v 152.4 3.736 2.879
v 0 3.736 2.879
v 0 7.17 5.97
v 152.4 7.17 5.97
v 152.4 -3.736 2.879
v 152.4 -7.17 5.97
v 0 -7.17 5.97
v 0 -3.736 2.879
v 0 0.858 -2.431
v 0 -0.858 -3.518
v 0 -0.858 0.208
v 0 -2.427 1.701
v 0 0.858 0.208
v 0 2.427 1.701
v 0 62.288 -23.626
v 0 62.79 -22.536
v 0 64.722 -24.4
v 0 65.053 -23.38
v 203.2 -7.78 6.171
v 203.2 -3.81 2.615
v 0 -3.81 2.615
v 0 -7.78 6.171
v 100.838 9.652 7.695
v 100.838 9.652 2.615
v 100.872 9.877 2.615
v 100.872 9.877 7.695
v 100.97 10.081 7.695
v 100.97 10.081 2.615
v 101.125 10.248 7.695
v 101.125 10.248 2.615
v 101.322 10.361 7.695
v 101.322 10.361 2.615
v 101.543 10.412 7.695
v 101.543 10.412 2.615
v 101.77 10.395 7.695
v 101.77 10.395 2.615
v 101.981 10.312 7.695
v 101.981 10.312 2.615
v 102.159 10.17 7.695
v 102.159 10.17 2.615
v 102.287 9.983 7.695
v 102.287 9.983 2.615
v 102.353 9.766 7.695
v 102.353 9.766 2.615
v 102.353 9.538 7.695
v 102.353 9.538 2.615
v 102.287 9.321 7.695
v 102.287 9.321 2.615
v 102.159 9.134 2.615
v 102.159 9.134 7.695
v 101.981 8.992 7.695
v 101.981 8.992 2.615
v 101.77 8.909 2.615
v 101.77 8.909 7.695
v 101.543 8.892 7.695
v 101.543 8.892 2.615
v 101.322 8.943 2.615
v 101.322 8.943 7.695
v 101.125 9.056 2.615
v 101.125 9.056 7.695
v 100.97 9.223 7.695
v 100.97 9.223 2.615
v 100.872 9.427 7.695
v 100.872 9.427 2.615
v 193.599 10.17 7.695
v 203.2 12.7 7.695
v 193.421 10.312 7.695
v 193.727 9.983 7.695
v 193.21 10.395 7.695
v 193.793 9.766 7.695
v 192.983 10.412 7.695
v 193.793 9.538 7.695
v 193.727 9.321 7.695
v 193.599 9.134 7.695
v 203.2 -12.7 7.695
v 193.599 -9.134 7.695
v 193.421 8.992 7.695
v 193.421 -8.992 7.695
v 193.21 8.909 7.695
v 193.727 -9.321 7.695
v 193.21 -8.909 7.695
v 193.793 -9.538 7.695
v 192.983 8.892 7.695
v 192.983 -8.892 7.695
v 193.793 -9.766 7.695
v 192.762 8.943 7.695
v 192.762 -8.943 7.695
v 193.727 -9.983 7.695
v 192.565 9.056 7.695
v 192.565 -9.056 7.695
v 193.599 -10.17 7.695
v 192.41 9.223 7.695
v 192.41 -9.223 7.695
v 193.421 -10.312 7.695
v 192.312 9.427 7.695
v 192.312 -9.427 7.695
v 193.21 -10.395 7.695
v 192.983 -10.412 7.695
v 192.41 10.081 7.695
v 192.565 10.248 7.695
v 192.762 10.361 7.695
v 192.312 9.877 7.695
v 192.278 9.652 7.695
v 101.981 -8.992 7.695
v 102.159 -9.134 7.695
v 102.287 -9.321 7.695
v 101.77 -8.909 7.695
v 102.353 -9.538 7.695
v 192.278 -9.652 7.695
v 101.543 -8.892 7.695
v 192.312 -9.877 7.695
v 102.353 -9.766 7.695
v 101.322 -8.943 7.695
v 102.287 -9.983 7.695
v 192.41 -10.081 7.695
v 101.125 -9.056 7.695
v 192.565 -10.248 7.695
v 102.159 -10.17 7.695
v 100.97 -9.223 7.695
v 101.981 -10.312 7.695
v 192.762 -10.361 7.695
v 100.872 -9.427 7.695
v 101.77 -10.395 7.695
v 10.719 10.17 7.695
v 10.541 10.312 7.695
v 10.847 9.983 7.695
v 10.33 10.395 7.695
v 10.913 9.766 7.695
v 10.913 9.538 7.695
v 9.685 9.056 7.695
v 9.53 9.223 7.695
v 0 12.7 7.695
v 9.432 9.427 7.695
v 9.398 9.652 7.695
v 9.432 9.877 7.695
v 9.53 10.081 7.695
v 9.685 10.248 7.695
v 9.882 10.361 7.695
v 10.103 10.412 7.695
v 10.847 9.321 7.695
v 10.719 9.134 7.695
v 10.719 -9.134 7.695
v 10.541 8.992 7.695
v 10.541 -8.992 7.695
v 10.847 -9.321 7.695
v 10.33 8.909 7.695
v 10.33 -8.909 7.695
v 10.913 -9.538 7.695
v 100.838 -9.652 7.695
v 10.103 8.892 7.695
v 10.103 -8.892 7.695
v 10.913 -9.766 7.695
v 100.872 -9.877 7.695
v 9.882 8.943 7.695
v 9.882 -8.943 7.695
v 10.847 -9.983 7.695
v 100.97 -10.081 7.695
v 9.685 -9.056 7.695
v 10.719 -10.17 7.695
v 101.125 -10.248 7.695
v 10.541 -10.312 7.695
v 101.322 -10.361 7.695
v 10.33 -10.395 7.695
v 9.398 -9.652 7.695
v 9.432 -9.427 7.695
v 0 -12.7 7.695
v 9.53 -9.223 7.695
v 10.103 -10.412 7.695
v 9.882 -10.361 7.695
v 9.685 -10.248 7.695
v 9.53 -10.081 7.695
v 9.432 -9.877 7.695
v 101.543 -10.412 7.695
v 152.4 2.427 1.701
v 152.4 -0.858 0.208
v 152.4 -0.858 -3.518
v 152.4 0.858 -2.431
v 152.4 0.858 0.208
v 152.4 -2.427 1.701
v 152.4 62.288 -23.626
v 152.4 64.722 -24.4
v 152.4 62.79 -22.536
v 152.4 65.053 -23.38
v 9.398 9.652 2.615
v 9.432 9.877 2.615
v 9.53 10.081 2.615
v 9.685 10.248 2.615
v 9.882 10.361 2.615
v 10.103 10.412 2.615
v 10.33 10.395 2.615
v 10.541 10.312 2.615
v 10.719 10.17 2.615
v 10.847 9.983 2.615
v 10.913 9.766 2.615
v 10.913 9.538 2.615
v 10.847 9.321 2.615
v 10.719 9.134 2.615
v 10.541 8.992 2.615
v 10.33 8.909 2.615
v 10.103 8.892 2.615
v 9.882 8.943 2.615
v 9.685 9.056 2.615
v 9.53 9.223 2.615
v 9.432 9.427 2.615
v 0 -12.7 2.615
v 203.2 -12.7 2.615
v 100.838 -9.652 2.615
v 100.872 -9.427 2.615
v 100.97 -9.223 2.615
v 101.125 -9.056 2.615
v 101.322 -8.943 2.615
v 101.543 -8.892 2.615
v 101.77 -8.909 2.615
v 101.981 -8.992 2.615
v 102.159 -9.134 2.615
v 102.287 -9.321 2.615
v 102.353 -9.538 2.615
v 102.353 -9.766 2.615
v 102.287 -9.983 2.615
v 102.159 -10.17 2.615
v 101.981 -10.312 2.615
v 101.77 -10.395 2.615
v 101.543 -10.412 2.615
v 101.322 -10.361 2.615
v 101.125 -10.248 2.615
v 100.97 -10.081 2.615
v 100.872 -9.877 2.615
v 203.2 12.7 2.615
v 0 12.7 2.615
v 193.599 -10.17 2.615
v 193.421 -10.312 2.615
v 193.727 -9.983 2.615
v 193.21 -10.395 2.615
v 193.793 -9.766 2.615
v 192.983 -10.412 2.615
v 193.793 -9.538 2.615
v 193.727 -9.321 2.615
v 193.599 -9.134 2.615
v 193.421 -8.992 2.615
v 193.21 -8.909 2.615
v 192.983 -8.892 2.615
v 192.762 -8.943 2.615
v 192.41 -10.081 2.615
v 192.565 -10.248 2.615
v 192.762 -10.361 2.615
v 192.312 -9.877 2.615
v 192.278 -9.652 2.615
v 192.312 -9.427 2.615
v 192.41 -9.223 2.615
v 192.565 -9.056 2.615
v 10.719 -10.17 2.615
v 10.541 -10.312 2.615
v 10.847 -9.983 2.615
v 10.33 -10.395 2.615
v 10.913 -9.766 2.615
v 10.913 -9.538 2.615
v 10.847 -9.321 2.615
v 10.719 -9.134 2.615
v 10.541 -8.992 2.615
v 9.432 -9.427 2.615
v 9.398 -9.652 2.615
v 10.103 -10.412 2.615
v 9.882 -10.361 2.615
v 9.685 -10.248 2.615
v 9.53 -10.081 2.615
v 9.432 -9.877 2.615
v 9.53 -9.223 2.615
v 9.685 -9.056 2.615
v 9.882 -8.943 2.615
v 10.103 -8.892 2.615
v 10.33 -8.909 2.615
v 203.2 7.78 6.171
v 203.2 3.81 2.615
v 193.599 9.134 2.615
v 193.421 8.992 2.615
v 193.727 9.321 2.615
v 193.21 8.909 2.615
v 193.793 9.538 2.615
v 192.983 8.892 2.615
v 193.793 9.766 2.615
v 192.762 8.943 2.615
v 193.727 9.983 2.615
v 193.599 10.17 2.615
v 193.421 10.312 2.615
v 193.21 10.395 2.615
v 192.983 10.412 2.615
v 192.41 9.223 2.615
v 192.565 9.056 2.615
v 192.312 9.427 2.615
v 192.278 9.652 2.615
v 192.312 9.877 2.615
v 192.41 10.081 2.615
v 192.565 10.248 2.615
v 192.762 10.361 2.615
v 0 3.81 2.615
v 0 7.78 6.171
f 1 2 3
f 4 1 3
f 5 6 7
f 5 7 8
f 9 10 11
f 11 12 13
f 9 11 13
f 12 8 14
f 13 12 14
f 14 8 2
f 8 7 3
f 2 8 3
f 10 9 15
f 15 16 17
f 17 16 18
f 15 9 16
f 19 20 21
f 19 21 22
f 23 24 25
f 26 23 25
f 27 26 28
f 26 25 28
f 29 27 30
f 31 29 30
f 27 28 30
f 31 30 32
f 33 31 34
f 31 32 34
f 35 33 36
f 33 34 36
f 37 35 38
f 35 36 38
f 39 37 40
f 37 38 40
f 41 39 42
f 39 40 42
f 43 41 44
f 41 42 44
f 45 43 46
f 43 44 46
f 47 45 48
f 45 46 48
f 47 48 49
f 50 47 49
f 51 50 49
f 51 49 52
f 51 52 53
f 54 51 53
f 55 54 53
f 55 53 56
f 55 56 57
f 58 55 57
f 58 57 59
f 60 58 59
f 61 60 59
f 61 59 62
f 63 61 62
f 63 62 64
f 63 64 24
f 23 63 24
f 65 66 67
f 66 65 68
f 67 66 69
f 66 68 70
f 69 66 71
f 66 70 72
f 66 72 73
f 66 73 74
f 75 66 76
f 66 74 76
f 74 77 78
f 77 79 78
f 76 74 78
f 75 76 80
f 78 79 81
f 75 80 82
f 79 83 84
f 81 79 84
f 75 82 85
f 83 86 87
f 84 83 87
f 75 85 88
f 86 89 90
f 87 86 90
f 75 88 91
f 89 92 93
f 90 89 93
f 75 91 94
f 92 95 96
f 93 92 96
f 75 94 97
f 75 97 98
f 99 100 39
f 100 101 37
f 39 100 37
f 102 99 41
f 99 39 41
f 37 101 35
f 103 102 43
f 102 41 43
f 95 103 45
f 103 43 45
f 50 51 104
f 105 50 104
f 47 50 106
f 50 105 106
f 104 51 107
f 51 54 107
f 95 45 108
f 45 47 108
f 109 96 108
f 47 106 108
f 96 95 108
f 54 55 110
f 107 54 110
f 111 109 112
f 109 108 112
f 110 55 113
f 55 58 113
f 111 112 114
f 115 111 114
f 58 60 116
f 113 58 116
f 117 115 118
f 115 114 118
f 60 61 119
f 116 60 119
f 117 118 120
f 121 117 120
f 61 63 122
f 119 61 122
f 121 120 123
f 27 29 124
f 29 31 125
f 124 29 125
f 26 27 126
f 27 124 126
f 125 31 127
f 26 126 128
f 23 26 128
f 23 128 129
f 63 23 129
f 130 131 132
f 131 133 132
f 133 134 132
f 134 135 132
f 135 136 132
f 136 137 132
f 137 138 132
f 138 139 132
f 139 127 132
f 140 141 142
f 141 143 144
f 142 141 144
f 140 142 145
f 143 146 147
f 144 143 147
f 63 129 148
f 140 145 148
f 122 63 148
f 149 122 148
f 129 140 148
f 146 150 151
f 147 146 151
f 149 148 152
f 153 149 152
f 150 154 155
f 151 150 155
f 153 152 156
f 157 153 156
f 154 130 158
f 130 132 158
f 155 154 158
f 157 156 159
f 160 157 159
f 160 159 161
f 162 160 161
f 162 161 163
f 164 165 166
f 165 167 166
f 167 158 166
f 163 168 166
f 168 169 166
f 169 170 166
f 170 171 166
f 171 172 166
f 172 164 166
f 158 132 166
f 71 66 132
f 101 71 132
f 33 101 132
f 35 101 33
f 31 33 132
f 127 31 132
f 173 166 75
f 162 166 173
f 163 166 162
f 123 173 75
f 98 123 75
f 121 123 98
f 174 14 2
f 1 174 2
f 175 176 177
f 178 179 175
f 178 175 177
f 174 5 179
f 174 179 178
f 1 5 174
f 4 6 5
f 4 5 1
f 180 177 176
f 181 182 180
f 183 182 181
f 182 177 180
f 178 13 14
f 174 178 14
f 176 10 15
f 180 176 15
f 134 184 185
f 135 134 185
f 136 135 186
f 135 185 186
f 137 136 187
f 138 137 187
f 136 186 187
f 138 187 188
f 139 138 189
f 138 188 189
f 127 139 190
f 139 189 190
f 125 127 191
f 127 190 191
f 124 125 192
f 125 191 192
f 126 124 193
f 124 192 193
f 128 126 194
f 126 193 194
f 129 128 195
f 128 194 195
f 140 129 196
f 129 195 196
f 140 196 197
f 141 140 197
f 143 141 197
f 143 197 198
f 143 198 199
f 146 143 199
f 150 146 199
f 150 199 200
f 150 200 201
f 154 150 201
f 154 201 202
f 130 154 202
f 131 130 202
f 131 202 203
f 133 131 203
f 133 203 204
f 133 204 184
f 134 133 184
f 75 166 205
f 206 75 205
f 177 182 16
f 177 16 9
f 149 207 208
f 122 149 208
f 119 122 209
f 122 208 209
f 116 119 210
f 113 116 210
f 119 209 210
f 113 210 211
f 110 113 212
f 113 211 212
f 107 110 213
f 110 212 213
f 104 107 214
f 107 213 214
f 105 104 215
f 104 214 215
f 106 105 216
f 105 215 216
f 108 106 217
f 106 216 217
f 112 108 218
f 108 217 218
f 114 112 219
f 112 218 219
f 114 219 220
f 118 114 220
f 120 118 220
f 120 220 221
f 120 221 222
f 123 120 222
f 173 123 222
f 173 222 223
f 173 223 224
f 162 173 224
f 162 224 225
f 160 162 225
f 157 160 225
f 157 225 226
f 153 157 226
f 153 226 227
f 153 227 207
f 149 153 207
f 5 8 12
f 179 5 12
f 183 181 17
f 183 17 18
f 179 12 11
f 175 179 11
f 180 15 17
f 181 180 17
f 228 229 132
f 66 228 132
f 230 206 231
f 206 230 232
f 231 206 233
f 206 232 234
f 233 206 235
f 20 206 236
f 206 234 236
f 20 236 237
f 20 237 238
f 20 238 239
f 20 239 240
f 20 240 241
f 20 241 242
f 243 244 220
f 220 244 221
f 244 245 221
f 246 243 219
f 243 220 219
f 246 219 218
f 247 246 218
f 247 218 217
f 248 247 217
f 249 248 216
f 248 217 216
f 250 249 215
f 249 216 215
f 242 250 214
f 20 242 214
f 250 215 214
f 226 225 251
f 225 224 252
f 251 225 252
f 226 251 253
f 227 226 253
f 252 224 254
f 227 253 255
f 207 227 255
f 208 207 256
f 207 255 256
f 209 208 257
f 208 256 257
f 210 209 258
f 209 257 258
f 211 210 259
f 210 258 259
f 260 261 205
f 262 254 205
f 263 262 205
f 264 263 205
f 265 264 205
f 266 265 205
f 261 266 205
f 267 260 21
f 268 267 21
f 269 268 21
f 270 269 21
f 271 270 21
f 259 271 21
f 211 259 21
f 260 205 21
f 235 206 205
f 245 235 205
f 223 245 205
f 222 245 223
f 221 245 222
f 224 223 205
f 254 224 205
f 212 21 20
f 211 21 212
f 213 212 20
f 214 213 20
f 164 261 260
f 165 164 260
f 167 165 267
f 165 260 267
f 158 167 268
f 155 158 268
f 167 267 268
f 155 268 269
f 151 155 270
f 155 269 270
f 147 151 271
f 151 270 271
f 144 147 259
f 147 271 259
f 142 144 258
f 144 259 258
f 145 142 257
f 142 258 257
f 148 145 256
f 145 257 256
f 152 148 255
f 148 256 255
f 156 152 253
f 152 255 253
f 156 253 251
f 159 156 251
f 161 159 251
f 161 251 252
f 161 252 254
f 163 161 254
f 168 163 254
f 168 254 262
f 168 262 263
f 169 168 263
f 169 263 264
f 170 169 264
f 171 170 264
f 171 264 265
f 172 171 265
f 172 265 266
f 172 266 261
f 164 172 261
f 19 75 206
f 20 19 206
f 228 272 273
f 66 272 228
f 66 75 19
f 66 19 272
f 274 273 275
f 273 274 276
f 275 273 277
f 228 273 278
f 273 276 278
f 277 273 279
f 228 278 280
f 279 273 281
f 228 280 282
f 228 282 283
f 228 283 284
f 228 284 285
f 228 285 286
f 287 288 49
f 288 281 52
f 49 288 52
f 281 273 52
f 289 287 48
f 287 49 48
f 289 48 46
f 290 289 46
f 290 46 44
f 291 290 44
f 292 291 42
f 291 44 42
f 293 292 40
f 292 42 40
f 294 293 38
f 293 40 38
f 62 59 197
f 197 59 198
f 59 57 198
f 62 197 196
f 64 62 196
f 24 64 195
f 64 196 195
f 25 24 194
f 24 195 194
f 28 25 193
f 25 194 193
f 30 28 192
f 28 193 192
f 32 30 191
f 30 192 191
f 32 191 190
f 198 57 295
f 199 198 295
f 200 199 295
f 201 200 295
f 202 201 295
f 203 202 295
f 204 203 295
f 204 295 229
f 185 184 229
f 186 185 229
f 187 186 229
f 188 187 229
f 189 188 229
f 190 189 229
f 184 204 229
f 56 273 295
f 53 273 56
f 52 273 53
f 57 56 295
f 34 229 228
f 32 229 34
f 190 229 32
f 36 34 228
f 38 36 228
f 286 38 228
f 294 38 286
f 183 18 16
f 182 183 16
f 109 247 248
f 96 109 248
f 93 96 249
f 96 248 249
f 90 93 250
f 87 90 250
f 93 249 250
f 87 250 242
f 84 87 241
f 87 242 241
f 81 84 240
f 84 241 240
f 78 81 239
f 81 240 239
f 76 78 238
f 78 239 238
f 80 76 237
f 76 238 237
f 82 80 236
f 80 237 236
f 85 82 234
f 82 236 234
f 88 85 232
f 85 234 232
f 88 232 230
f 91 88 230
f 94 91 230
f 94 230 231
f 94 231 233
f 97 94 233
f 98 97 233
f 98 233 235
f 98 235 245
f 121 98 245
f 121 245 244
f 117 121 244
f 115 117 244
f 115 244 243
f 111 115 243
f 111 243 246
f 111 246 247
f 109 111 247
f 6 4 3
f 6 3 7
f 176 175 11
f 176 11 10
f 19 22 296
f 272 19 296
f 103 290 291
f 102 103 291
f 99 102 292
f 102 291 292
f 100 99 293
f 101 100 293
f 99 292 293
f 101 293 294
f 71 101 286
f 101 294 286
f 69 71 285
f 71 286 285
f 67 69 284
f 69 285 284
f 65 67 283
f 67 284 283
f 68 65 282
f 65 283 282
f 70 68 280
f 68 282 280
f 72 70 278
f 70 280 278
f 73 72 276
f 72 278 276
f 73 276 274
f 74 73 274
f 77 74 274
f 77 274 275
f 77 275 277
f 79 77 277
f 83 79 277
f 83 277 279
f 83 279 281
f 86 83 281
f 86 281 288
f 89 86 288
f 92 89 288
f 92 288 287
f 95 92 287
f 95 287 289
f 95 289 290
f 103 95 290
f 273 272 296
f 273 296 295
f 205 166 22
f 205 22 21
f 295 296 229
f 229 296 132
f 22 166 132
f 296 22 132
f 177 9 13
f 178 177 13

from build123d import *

# Parameters (mm, degrees)
F1_DEPTH = 203.2
F3_D     = 1.524
F5_DEPTH = 152.4


with BuildPart() as f1:
    # F0 (on Right) → F1 (new body)
    with BuildSketch(Plane.YZ):
        Polygon((12.7, 7.694937), (0, 7.694937), (-12.7, 7.694937), (-12.7, 2.614937), (-3.81, 2.614937), (-7.779781, 6.170937), (0, 6.170937), (7.779781, 6.170937), (3.81, 2.614937), (12.7, 2.614937), align=None)
    extrude(amount=F1_DEPTH)

    # F3 (through all)
    with Locations(Plane.XY.offset(7.694937)):
        with Locations((101.6, 9.652), (101.6, -9.652), (10.16, 9.652), (10.16, -9.652), (193.04, 9.652), (193.04, -9.652)):
            Hole(F3_D / 2)


with BuildPart() as f5:
    # F4 (on Right) → F5 (new body)
    with BuildSketch(Plane.YZ):
        Polygon((7.169987, 5.969987), (0, 5.969987), (-7.169987, 5.969987), (-3.735641, 2.879075), (-2.427159, 1.701441), (-0.858493, 0.208051), (-0.858493, -3.517505), (62.288381, -23.625547), (64.721783, -24.400422), (65.053132, -23.379736), (62.789544, -22.535508), (0.858493, -2.430653), (0.858493, 0.208051), (2.427159, 1.701441), (3.735641, 2.879075), align=None)
    extrude(amount=F5_DEPTH)


solid = Compound([f1.part, f5.part])
